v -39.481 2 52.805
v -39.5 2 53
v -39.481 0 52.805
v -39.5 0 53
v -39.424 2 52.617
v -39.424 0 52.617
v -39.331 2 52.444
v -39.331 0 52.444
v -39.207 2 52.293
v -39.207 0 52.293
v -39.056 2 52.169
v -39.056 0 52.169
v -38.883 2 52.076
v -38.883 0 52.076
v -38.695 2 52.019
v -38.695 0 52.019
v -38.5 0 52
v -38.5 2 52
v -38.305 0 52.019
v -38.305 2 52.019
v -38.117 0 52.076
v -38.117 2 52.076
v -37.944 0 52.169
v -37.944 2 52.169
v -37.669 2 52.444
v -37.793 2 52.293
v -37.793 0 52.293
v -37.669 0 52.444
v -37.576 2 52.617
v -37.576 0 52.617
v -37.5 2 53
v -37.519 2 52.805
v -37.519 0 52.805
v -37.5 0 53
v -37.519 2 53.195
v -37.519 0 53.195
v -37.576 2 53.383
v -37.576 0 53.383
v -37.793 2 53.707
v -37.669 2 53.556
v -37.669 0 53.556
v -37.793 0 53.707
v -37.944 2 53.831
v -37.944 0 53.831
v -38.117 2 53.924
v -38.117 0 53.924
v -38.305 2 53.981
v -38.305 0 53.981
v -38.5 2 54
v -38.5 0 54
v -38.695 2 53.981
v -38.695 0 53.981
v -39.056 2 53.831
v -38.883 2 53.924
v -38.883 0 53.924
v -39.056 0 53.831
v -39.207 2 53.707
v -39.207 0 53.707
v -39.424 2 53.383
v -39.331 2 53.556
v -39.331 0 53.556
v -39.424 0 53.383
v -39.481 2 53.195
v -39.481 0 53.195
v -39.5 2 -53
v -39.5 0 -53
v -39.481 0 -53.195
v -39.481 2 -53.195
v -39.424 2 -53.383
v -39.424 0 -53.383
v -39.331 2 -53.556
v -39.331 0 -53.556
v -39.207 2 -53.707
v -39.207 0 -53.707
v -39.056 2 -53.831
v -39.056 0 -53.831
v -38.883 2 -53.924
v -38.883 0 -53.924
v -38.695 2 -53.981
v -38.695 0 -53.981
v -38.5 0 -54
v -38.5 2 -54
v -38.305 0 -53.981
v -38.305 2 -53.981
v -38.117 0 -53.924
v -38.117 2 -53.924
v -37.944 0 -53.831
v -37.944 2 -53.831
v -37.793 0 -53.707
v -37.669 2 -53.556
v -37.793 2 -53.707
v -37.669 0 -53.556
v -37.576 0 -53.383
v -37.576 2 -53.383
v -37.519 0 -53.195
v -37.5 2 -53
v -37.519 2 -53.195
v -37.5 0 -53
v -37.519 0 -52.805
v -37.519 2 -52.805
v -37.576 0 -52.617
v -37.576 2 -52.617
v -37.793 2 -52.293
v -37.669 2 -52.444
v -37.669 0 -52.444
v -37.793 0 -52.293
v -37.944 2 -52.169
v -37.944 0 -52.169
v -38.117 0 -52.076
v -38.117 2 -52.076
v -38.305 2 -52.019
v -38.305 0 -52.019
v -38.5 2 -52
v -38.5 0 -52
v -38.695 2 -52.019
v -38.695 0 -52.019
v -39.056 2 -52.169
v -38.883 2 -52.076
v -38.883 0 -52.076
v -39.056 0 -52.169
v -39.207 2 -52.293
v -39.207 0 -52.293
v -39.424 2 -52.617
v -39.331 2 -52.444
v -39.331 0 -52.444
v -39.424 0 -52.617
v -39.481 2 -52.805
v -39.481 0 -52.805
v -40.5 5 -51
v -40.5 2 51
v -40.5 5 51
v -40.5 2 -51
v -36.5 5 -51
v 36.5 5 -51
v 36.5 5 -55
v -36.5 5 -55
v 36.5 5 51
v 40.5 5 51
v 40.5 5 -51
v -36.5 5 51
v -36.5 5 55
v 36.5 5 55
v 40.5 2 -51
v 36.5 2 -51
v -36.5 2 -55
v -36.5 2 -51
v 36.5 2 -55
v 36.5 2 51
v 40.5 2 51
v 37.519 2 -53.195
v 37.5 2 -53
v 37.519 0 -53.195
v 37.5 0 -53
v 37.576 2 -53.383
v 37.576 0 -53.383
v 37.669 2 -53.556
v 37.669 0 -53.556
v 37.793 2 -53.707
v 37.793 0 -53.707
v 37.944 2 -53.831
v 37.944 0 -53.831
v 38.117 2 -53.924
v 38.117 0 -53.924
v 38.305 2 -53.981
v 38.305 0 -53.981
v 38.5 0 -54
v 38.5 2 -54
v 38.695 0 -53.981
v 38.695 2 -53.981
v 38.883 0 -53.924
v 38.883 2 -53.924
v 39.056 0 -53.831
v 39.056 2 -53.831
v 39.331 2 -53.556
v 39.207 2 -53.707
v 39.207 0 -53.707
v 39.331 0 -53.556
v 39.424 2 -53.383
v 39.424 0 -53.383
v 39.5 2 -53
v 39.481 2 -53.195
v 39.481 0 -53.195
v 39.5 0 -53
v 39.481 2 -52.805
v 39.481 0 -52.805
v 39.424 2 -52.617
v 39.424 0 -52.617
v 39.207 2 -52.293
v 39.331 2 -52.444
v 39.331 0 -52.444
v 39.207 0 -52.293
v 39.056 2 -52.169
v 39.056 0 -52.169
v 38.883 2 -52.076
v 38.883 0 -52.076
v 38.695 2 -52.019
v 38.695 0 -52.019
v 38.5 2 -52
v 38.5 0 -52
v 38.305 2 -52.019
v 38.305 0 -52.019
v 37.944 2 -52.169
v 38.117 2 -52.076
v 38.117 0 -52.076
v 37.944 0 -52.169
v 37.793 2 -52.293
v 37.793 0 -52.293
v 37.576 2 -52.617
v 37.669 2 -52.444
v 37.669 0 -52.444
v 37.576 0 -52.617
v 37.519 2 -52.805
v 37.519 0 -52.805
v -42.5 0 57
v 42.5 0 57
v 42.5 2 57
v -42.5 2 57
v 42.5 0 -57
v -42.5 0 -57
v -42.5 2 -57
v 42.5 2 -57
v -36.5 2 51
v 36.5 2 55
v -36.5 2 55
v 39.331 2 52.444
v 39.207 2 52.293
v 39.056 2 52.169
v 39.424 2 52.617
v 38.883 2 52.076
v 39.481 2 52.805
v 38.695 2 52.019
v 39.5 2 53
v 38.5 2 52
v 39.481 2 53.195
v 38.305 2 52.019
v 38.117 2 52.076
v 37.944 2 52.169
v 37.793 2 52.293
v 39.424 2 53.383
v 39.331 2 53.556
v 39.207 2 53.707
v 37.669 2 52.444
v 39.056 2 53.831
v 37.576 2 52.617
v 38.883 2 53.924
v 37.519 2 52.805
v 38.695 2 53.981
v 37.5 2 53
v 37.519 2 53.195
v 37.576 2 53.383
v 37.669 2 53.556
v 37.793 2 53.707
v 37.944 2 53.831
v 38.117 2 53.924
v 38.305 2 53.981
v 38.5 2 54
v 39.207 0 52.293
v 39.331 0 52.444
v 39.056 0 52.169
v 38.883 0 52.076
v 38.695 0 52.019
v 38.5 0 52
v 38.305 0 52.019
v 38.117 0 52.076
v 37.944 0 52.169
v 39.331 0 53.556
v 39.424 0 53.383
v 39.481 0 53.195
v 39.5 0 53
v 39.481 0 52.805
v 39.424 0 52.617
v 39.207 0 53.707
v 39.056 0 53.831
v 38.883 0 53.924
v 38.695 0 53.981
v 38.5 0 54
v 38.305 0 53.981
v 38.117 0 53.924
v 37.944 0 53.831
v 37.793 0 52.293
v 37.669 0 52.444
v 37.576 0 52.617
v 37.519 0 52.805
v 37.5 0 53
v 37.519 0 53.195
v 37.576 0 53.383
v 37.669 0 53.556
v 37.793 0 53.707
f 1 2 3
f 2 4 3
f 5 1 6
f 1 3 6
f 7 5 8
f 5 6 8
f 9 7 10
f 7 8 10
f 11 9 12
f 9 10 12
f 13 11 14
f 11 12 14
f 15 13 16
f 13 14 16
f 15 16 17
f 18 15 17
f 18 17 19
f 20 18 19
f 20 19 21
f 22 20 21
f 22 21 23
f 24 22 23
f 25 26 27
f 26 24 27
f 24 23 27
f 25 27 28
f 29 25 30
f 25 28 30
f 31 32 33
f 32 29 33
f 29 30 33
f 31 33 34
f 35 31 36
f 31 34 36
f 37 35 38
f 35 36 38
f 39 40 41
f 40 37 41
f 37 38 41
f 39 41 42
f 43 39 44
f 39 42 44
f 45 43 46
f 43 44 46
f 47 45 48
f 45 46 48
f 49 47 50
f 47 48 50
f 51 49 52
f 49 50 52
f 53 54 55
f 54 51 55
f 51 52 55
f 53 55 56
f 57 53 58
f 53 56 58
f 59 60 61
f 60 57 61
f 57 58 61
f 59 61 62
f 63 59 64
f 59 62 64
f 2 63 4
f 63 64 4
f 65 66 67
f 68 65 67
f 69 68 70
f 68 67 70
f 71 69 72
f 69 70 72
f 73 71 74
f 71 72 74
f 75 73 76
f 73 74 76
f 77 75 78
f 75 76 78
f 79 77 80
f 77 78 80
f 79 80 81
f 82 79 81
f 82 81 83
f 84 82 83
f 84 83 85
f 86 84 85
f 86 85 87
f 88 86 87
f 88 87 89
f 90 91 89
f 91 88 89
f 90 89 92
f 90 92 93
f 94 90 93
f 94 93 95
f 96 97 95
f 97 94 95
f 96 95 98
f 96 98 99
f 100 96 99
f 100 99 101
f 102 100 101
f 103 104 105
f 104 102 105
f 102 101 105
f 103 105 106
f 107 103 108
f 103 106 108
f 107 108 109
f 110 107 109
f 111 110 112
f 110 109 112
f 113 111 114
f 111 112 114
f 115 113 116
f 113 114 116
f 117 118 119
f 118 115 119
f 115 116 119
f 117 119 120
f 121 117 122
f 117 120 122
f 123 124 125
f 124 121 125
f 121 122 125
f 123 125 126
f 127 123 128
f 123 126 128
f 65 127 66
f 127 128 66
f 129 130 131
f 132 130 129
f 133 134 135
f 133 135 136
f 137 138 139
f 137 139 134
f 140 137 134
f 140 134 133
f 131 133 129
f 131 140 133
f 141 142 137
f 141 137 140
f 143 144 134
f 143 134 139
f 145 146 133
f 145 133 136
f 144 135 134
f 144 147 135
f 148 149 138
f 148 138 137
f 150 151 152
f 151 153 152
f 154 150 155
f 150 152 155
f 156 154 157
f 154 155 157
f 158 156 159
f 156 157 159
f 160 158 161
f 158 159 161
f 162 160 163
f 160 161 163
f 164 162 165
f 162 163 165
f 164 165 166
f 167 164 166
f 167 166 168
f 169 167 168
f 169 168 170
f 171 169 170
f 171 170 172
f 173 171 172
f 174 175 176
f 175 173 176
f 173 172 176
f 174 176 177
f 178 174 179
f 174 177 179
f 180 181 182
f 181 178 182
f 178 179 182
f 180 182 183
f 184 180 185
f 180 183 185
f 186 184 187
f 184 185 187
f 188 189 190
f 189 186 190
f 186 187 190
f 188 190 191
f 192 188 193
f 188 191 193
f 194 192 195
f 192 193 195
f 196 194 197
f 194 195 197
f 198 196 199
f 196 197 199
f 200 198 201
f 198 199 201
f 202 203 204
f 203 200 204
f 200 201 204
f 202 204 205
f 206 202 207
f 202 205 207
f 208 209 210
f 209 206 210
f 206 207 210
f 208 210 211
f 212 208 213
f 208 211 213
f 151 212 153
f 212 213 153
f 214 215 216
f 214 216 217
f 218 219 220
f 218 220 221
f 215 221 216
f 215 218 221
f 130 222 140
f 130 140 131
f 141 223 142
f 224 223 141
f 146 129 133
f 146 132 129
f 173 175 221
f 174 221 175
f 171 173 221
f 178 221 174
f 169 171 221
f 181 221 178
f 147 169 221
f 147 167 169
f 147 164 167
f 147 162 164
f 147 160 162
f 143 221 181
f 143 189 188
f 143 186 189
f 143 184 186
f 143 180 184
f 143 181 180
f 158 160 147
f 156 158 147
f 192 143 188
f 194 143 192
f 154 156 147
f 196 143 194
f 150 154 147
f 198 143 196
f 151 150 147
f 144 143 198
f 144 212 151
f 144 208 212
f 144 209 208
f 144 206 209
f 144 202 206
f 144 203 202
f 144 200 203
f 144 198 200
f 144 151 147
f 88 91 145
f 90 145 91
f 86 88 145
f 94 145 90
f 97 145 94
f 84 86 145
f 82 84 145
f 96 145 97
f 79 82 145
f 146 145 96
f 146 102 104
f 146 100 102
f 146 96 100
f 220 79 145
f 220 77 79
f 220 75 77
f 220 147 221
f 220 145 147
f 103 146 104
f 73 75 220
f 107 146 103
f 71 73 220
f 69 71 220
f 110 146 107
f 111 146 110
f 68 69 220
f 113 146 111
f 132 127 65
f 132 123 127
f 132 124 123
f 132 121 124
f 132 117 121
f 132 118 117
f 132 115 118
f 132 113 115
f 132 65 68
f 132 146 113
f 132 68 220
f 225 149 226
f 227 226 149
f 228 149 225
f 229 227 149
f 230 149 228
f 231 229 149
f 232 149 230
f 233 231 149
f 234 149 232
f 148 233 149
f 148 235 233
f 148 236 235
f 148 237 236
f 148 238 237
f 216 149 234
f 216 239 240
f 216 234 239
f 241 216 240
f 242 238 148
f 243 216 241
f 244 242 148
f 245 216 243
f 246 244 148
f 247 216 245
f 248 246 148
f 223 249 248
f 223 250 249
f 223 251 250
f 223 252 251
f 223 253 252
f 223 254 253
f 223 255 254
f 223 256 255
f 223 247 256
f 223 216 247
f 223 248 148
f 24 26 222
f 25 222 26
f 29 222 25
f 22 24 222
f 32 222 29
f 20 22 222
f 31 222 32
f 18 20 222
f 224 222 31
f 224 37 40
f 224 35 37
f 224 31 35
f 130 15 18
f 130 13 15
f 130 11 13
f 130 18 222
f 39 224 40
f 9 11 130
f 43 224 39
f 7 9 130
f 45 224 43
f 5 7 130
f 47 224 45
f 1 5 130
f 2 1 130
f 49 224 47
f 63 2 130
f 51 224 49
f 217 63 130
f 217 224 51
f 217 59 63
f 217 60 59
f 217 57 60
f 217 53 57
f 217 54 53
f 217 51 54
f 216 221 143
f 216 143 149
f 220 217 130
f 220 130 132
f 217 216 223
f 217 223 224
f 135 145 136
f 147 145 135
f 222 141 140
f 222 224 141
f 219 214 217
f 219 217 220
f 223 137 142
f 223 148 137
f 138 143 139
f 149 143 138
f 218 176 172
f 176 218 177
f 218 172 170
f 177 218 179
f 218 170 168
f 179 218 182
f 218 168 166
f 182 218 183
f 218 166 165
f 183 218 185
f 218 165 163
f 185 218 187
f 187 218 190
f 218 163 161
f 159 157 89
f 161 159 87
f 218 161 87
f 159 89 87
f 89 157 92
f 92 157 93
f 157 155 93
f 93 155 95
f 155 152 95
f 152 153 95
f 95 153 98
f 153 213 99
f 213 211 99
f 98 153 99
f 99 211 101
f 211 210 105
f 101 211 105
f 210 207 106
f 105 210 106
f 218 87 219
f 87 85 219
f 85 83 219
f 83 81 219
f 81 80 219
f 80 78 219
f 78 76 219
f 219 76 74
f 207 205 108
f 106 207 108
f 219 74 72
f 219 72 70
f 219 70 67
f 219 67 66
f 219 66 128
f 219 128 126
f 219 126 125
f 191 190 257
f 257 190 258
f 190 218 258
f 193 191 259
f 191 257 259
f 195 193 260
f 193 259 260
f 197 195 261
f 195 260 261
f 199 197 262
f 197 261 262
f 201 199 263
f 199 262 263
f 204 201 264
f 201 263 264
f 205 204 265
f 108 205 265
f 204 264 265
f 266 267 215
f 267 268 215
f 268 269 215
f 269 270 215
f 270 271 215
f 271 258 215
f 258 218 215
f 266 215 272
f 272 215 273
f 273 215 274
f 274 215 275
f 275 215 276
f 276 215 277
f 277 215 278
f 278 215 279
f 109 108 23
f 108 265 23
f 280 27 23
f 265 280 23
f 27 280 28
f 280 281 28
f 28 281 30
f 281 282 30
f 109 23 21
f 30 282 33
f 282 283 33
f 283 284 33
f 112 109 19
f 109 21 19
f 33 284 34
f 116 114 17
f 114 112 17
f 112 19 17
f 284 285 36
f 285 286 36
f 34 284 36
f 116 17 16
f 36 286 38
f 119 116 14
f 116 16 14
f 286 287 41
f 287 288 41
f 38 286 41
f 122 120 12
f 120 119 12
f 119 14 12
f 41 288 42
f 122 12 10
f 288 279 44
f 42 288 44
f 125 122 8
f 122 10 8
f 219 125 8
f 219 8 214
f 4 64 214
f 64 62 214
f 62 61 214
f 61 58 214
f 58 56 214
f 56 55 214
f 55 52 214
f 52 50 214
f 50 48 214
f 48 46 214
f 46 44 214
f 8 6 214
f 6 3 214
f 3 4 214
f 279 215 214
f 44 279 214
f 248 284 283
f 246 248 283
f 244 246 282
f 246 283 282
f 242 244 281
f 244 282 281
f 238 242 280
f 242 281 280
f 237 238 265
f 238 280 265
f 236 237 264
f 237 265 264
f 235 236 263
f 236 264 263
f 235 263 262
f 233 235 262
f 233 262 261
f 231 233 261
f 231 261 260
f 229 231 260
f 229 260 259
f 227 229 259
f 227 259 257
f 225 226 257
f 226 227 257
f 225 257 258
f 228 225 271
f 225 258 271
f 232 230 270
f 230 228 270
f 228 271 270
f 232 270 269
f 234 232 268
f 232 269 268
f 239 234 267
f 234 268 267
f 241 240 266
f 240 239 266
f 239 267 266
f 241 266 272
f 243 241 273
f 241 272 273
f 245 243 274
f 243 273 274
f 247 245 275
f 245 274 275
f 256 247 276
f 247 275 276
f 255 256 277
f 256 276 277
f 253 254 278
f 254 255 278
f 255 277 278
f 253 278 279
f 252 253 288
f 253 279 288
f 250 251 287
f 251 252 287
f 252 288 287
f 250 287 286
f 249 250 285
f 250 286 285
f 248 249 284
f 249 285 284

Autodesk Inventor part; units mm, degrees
ref_plane "YZ Plane" through (0, 0, 0) normal (1, 0, 0) x (0, 1, 0)
ref_plane "XY Plane" through (0, 0, 0) normal (0, 0, 1) x (1, 0, 0)
sketch "Sketch7" plane through (0, 0, 0) normal (0, 1, 0) x (-1, 0, 0)
  line L0 (-42.5, 57) -> (42.5, 57)
  line L1 (42.5, 57) -> (42.5, -57)
  line L2 (42.5, -57) -> (-42.5, -57)
  line L3 (-42.5, -57) -> (-42.5, 57)
  line L4 (-42.5, 57) -> (42.5, -57) construction
  line L5 (42.5, 57) -> (-42.5, -57) construction
  line L6 (-40.5, 55) -> (40.5, -55) construction
  line L7 (40.5, 55) -> (-40.5, -55) construction
  line L8 (36.5, 55) -> (36.5, 51)
  line L9 (36.5, 51) -> (40.5, 51)
  line L10 (36.5, -55) -> (36.5, -51)
  line L11 (36.5, -51) -> (40.5, -51)
  line L12 (-36.5, -55) -> (-36.5, -51)
  line L13 (-36.5, -51) -> (-40.5, -51)
  line L14 (-36.5, 55) -> (-36.5, 51)
  line L15 (-36.5, 51) -> (-40.5, 51)
  line L16 (40.5, -51) -> (40.5, 51)
  line L17 (36.5, 55) -> (-36.5, 55)
  line L18 (-40.5, 51) -> (-40.5, -51)
  line L19 (-36.5, -55) -> (36.5, -55)
  circle A0 centre (38.5, 53) radius 1
  circle A1 centre (38.5, -53) radius 1
  circle A2 centre (-38.5, 53) radius 1
  circle A3 centre (-38.5, -53) radius 1
  point P0 (0, 0)
  dimension "d36" = 85
  dimension "d37" = 114
  dimension "d38" = 81
  dimension "d39" = 110
  dimension "d40" = 4
  dimension "d41" = 4
  dimension "d42" = 4
  dimension "d43" = 4
  dimension "d44" = 4
  dimension "d45" = 4
  dimension "d46" = 4
  dimension "d47" = 4
  dimension "d48" = 2
  dimension "d49" = 2
  dimension "d50" = 2
  dimension "d51" = 2
extrude "Extrusion4" add sketch "Sketch7" along normal blind 2
sketch "Sketch8" plane through (0, 0, 0) normal (0, 1, 0) x (-1, 0, 0)
  point P0 (0, 0)
sketch "Sketch9" plane through (0, 0, 0) normal (0, 1, 0) x (-1, 0, 0)
  line L0 (36.5, 55) -> (36.5, 51) projected
  line L1 (36.5, 51) -> (40.5, 51) projected
  line L2 (36.5, 51) -> (40.5, 51)
  line L3 (40.5, -51) -> (36.5, -51) projected
  line L4 (40.5, 51) -> (40.5, -51)
  line L5 (40.5, -51) -> (36.5, -51)
  line L6 (36.5, -51) -> (36.5, -55) projected
  line L7 (36.5, -51) -> (36.5, -55)
  line L8 (36.5, -55) -> (-36.5, -55) projected
  line L9 (36.5, -55) -> (-36.5, -55)
  line L10 (-36.5, -55) -> (-36.5, -51)
  line L11 (-40.5, -51) -> (-40.5, 51) projected
  line L12 (-36.5, -51) -> (-40.5, -51)
  line L13 (-40.5, -51) -> (-40.5, 51)
  line L14 (-40.5, 51) -> (-36.5, 51) projected
  line L15 (-40.5, 51) -> (-36.5, 51)
  line L16 (-36.5, 55) -> (36.5, 55) projected
  line L17 (-36.5, 51) -> (-36.5, 55)
  line L18 (-36.5, 55) -> (36.5, 55)
  line L19 (36.5, 55) -> (36.5, 51)
  point P0 (0, 0)
extrude "Extrusion5" add sketch "Sketch9" along normal blind 5
properties part number "bottom plant watner"
